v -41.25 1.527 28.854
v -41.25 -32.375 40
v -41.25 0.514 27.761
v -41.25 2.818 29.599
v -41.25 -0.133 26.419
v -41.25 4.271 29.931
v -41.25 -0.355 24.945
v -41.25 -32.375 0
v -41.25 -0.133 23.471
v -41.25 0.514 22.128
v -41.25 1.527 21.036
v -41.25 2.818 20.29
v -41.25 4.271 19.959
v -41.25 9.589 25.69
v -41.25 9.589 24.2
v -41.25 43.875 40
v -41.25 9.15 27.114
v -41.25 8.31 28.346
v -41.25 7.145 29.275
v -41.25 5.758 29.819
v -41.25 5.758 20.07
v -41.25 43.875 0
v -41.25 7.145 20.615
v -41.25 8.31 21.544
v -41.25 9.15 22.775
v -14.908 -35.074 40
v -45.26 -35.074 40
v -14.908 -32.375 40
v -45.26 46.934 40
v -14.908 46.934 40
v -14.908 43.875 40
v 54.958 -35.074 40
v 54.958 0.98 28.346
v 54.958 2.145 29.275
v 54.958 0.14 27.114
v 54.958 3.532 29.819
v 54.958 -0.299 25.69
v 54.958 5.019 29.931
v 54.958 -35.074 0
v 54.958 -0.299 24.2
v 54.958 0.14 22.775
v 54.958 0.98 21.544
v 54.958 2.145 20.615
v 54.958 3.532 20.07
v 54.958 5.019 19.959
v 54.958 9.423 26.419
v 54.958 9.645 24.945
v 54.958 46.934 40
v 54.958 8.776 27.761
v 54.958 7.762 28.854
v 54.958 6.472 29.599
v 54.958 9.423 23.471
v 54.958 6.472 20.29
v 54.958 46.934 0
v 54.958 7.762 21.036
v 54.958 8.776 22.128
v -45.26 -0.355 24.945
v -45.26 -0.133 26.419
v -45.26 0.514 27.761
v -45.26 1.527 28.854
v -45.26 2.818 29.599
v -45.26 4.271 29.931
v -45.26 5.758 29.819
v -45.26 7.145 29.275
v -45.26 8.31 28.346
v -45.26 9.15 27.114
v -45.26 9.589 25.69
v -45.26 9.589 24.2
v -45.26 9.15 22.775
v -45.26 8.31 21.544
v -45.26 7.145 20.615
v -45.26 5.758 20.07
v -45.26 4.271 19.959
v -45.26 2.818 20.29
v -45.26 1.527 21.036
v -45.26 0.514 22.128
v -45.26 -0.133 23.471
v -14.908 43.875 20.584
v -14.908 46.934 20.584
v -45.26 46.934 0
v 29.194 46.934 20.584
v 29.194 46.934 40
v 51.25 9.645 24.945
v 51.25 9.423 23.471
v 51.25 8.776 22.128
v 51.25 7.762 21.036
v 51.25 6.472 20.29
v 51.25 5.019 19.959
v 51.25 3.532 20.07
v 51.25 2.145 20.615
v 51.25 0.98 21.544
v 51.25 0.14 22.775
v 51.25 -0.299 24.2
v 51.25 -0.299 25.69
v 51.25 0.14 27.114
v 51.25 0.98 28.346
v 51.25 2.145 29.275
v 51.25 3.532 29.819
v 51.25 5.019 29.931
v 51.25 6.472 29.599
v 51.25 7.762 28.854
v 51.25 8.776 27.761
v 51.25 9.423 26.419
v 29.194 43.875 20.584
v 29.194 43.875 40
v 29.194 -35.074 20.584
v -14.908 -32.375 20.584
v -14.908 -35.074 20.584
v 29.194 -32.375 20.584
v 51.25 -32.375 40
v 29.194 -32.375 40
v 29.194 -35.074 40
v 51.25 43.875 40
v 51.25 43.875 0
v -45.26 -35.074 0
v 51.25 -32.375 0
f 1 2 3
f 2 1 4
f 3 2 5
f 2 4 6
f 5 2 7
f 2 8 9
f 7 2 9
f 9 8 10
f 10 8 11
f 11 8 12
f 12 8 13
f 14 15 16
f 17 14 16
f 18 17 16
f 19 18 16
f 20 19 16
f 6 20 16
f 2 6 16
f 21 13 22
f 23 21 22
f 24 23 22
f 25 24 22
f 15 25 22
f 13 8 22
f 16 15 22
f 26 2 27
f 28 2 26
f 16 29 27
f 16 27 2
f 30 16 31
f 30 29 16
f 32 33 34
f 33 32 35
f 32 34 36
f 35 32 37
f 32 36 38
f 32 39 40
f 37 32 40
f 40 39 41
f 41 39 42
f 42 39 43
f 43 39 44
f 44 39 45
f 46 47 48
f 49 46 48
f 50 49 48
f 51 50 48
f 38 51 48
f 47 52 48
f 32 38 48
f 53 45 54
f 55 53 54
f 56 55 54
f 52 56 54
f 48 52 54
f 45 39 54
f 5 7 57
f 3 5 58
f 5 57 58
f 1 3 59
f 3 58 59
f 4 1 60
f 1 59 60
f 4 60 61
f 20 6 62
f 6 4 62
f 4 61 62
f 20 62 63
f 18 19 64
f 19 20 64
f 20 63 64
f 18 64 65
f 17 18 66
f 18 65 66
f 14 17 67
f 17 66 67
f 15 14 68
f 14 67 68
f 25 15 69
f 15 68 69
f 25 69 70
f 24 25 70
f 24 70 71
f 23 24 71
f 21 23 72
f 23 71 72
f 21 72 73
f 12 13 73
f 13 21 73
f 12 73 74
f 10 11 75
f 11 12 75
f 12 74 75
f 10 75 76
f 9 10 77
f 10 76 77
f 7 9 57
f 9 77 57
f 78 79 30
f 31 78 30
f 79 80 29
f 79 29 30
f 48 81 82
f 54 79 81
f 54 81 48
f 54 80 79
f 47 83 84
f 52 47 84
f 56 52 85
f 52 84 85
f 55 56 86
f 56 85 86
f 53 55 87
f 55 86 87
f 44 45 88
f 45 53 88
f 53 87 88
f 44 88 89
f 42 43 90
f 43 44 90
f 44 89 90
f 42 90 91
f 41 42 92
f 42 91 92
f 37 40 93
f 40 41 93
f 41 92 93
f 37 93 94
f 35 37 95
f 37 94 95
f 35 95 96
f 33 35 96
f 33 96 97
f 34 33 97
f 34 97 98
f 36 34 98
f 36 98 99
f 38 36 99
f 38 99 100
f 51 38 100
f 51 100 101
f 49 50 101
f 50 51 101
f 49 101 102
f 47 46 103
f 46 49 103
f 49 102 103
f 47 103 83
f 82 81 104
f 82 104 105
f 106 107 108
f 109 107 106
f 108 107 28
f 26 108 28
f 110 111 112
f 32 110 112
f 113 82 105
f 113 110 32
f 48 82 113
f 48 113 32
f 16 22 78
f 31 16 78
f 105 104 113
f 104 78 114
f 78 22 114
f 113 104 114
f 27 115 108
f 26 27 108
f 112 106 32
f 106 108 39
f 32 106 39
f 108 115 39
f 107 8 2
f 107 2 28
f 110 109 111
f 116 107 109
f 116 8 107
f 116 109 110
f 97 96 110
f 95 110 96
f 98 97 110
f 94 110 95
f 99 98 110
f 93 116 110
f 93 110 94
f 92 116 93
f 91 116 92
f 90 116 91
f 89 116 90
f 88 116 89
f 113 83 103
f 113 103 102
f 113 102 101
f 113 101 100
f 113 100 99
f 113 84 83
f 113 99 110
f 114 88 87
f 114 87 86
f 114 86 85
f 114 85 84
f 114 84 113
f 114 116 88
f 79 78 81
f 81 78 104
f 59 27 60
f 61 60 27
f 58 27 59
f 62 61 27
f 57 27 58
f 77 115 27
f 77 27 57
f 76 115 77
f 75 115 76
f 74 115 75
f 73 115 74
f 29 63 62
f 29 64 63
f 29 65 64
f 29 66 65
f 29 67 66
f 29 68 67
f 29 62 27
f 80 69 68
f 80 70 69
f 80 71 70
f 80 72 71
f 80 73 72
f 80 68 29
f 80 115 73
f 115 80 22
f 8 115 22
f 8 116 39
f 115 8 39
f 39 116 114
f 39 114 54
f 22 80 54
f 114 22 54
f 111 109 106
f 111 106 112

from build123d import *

# Parameters (mm, degrees)
F0_W          = 100.2182774246
F0_H          = 82.0081606507
F3_DEPTH      = 40
F4_D          = 10
F4_DEPTH      = 54.9592019448
F5_D          = 10
F1_W          = 44.1022608429
F1_H          = 32.8041445464
F6_DEPTH      = 60.3
F6_DEPTH_BACK = 51.5
F7_W          = 92.5000049174
F7_H          = 76.2500017881
F8_DEPTH      = 52.4
F8_DEPTH_BACK = 25


with BuildPart() as f3:
    # F0 (on Top) → F3 (new body)
    with BuildSketch(Plane.XY):
        with Locations((4.8490632325, 5.9297867119)):
            Rectangle(F0_W, F0_H)
    extrude(amount=F3_DEPTH)

    # F4 (through all, one way)
    with BuildSketch(Plane(origin=(0, 0, 0), x_dir=(0, 1, 0), z_dir=(-1, 0, 0))):
        with Locations((4.6449177898, -24.9448493123)):
            Circle(F4_D / 2)
    extrude(amount=-F4_DEPTH, mode=Mode.SUBTRACT)

    # F5 (through all)
    with Locations(Plane.YZ):
        with Locations((4.6449177898, 24.9448493123)):
            Hole(F5_D / 2)

    # F1 (on Front) → F6 (cut, two sides)
    with BuildSketch(Plane.XZ) as f6_sk:
        with Locations((7.1431370452, 36.986050196)):
            Rectangle(F1_W, F1_H)
    extrude(amount=-F6_DEPTH, mode=Mode.SUBTRACT)
    extrude(f6_sk.sketch, amount=F6_DEPTH_BACK, mode=Mode.SUBTRACT)

    # F7 (on Top) → F8 (cut, two sides)
    with BuildSketch(Plane.XY) as f8_sk:
        with Locations((5.0000008196, 5.7500004768)):
            Rectangle(F7_W, F7_H)
    extrude(amount=F8_DEPTH, mode=Mode.SUBTRACT)
    extrude(f8_sk.sketch, amount=-F8_DEPTH_BACK, mode=Mode.SUBTRACT)


solid = f3.part
